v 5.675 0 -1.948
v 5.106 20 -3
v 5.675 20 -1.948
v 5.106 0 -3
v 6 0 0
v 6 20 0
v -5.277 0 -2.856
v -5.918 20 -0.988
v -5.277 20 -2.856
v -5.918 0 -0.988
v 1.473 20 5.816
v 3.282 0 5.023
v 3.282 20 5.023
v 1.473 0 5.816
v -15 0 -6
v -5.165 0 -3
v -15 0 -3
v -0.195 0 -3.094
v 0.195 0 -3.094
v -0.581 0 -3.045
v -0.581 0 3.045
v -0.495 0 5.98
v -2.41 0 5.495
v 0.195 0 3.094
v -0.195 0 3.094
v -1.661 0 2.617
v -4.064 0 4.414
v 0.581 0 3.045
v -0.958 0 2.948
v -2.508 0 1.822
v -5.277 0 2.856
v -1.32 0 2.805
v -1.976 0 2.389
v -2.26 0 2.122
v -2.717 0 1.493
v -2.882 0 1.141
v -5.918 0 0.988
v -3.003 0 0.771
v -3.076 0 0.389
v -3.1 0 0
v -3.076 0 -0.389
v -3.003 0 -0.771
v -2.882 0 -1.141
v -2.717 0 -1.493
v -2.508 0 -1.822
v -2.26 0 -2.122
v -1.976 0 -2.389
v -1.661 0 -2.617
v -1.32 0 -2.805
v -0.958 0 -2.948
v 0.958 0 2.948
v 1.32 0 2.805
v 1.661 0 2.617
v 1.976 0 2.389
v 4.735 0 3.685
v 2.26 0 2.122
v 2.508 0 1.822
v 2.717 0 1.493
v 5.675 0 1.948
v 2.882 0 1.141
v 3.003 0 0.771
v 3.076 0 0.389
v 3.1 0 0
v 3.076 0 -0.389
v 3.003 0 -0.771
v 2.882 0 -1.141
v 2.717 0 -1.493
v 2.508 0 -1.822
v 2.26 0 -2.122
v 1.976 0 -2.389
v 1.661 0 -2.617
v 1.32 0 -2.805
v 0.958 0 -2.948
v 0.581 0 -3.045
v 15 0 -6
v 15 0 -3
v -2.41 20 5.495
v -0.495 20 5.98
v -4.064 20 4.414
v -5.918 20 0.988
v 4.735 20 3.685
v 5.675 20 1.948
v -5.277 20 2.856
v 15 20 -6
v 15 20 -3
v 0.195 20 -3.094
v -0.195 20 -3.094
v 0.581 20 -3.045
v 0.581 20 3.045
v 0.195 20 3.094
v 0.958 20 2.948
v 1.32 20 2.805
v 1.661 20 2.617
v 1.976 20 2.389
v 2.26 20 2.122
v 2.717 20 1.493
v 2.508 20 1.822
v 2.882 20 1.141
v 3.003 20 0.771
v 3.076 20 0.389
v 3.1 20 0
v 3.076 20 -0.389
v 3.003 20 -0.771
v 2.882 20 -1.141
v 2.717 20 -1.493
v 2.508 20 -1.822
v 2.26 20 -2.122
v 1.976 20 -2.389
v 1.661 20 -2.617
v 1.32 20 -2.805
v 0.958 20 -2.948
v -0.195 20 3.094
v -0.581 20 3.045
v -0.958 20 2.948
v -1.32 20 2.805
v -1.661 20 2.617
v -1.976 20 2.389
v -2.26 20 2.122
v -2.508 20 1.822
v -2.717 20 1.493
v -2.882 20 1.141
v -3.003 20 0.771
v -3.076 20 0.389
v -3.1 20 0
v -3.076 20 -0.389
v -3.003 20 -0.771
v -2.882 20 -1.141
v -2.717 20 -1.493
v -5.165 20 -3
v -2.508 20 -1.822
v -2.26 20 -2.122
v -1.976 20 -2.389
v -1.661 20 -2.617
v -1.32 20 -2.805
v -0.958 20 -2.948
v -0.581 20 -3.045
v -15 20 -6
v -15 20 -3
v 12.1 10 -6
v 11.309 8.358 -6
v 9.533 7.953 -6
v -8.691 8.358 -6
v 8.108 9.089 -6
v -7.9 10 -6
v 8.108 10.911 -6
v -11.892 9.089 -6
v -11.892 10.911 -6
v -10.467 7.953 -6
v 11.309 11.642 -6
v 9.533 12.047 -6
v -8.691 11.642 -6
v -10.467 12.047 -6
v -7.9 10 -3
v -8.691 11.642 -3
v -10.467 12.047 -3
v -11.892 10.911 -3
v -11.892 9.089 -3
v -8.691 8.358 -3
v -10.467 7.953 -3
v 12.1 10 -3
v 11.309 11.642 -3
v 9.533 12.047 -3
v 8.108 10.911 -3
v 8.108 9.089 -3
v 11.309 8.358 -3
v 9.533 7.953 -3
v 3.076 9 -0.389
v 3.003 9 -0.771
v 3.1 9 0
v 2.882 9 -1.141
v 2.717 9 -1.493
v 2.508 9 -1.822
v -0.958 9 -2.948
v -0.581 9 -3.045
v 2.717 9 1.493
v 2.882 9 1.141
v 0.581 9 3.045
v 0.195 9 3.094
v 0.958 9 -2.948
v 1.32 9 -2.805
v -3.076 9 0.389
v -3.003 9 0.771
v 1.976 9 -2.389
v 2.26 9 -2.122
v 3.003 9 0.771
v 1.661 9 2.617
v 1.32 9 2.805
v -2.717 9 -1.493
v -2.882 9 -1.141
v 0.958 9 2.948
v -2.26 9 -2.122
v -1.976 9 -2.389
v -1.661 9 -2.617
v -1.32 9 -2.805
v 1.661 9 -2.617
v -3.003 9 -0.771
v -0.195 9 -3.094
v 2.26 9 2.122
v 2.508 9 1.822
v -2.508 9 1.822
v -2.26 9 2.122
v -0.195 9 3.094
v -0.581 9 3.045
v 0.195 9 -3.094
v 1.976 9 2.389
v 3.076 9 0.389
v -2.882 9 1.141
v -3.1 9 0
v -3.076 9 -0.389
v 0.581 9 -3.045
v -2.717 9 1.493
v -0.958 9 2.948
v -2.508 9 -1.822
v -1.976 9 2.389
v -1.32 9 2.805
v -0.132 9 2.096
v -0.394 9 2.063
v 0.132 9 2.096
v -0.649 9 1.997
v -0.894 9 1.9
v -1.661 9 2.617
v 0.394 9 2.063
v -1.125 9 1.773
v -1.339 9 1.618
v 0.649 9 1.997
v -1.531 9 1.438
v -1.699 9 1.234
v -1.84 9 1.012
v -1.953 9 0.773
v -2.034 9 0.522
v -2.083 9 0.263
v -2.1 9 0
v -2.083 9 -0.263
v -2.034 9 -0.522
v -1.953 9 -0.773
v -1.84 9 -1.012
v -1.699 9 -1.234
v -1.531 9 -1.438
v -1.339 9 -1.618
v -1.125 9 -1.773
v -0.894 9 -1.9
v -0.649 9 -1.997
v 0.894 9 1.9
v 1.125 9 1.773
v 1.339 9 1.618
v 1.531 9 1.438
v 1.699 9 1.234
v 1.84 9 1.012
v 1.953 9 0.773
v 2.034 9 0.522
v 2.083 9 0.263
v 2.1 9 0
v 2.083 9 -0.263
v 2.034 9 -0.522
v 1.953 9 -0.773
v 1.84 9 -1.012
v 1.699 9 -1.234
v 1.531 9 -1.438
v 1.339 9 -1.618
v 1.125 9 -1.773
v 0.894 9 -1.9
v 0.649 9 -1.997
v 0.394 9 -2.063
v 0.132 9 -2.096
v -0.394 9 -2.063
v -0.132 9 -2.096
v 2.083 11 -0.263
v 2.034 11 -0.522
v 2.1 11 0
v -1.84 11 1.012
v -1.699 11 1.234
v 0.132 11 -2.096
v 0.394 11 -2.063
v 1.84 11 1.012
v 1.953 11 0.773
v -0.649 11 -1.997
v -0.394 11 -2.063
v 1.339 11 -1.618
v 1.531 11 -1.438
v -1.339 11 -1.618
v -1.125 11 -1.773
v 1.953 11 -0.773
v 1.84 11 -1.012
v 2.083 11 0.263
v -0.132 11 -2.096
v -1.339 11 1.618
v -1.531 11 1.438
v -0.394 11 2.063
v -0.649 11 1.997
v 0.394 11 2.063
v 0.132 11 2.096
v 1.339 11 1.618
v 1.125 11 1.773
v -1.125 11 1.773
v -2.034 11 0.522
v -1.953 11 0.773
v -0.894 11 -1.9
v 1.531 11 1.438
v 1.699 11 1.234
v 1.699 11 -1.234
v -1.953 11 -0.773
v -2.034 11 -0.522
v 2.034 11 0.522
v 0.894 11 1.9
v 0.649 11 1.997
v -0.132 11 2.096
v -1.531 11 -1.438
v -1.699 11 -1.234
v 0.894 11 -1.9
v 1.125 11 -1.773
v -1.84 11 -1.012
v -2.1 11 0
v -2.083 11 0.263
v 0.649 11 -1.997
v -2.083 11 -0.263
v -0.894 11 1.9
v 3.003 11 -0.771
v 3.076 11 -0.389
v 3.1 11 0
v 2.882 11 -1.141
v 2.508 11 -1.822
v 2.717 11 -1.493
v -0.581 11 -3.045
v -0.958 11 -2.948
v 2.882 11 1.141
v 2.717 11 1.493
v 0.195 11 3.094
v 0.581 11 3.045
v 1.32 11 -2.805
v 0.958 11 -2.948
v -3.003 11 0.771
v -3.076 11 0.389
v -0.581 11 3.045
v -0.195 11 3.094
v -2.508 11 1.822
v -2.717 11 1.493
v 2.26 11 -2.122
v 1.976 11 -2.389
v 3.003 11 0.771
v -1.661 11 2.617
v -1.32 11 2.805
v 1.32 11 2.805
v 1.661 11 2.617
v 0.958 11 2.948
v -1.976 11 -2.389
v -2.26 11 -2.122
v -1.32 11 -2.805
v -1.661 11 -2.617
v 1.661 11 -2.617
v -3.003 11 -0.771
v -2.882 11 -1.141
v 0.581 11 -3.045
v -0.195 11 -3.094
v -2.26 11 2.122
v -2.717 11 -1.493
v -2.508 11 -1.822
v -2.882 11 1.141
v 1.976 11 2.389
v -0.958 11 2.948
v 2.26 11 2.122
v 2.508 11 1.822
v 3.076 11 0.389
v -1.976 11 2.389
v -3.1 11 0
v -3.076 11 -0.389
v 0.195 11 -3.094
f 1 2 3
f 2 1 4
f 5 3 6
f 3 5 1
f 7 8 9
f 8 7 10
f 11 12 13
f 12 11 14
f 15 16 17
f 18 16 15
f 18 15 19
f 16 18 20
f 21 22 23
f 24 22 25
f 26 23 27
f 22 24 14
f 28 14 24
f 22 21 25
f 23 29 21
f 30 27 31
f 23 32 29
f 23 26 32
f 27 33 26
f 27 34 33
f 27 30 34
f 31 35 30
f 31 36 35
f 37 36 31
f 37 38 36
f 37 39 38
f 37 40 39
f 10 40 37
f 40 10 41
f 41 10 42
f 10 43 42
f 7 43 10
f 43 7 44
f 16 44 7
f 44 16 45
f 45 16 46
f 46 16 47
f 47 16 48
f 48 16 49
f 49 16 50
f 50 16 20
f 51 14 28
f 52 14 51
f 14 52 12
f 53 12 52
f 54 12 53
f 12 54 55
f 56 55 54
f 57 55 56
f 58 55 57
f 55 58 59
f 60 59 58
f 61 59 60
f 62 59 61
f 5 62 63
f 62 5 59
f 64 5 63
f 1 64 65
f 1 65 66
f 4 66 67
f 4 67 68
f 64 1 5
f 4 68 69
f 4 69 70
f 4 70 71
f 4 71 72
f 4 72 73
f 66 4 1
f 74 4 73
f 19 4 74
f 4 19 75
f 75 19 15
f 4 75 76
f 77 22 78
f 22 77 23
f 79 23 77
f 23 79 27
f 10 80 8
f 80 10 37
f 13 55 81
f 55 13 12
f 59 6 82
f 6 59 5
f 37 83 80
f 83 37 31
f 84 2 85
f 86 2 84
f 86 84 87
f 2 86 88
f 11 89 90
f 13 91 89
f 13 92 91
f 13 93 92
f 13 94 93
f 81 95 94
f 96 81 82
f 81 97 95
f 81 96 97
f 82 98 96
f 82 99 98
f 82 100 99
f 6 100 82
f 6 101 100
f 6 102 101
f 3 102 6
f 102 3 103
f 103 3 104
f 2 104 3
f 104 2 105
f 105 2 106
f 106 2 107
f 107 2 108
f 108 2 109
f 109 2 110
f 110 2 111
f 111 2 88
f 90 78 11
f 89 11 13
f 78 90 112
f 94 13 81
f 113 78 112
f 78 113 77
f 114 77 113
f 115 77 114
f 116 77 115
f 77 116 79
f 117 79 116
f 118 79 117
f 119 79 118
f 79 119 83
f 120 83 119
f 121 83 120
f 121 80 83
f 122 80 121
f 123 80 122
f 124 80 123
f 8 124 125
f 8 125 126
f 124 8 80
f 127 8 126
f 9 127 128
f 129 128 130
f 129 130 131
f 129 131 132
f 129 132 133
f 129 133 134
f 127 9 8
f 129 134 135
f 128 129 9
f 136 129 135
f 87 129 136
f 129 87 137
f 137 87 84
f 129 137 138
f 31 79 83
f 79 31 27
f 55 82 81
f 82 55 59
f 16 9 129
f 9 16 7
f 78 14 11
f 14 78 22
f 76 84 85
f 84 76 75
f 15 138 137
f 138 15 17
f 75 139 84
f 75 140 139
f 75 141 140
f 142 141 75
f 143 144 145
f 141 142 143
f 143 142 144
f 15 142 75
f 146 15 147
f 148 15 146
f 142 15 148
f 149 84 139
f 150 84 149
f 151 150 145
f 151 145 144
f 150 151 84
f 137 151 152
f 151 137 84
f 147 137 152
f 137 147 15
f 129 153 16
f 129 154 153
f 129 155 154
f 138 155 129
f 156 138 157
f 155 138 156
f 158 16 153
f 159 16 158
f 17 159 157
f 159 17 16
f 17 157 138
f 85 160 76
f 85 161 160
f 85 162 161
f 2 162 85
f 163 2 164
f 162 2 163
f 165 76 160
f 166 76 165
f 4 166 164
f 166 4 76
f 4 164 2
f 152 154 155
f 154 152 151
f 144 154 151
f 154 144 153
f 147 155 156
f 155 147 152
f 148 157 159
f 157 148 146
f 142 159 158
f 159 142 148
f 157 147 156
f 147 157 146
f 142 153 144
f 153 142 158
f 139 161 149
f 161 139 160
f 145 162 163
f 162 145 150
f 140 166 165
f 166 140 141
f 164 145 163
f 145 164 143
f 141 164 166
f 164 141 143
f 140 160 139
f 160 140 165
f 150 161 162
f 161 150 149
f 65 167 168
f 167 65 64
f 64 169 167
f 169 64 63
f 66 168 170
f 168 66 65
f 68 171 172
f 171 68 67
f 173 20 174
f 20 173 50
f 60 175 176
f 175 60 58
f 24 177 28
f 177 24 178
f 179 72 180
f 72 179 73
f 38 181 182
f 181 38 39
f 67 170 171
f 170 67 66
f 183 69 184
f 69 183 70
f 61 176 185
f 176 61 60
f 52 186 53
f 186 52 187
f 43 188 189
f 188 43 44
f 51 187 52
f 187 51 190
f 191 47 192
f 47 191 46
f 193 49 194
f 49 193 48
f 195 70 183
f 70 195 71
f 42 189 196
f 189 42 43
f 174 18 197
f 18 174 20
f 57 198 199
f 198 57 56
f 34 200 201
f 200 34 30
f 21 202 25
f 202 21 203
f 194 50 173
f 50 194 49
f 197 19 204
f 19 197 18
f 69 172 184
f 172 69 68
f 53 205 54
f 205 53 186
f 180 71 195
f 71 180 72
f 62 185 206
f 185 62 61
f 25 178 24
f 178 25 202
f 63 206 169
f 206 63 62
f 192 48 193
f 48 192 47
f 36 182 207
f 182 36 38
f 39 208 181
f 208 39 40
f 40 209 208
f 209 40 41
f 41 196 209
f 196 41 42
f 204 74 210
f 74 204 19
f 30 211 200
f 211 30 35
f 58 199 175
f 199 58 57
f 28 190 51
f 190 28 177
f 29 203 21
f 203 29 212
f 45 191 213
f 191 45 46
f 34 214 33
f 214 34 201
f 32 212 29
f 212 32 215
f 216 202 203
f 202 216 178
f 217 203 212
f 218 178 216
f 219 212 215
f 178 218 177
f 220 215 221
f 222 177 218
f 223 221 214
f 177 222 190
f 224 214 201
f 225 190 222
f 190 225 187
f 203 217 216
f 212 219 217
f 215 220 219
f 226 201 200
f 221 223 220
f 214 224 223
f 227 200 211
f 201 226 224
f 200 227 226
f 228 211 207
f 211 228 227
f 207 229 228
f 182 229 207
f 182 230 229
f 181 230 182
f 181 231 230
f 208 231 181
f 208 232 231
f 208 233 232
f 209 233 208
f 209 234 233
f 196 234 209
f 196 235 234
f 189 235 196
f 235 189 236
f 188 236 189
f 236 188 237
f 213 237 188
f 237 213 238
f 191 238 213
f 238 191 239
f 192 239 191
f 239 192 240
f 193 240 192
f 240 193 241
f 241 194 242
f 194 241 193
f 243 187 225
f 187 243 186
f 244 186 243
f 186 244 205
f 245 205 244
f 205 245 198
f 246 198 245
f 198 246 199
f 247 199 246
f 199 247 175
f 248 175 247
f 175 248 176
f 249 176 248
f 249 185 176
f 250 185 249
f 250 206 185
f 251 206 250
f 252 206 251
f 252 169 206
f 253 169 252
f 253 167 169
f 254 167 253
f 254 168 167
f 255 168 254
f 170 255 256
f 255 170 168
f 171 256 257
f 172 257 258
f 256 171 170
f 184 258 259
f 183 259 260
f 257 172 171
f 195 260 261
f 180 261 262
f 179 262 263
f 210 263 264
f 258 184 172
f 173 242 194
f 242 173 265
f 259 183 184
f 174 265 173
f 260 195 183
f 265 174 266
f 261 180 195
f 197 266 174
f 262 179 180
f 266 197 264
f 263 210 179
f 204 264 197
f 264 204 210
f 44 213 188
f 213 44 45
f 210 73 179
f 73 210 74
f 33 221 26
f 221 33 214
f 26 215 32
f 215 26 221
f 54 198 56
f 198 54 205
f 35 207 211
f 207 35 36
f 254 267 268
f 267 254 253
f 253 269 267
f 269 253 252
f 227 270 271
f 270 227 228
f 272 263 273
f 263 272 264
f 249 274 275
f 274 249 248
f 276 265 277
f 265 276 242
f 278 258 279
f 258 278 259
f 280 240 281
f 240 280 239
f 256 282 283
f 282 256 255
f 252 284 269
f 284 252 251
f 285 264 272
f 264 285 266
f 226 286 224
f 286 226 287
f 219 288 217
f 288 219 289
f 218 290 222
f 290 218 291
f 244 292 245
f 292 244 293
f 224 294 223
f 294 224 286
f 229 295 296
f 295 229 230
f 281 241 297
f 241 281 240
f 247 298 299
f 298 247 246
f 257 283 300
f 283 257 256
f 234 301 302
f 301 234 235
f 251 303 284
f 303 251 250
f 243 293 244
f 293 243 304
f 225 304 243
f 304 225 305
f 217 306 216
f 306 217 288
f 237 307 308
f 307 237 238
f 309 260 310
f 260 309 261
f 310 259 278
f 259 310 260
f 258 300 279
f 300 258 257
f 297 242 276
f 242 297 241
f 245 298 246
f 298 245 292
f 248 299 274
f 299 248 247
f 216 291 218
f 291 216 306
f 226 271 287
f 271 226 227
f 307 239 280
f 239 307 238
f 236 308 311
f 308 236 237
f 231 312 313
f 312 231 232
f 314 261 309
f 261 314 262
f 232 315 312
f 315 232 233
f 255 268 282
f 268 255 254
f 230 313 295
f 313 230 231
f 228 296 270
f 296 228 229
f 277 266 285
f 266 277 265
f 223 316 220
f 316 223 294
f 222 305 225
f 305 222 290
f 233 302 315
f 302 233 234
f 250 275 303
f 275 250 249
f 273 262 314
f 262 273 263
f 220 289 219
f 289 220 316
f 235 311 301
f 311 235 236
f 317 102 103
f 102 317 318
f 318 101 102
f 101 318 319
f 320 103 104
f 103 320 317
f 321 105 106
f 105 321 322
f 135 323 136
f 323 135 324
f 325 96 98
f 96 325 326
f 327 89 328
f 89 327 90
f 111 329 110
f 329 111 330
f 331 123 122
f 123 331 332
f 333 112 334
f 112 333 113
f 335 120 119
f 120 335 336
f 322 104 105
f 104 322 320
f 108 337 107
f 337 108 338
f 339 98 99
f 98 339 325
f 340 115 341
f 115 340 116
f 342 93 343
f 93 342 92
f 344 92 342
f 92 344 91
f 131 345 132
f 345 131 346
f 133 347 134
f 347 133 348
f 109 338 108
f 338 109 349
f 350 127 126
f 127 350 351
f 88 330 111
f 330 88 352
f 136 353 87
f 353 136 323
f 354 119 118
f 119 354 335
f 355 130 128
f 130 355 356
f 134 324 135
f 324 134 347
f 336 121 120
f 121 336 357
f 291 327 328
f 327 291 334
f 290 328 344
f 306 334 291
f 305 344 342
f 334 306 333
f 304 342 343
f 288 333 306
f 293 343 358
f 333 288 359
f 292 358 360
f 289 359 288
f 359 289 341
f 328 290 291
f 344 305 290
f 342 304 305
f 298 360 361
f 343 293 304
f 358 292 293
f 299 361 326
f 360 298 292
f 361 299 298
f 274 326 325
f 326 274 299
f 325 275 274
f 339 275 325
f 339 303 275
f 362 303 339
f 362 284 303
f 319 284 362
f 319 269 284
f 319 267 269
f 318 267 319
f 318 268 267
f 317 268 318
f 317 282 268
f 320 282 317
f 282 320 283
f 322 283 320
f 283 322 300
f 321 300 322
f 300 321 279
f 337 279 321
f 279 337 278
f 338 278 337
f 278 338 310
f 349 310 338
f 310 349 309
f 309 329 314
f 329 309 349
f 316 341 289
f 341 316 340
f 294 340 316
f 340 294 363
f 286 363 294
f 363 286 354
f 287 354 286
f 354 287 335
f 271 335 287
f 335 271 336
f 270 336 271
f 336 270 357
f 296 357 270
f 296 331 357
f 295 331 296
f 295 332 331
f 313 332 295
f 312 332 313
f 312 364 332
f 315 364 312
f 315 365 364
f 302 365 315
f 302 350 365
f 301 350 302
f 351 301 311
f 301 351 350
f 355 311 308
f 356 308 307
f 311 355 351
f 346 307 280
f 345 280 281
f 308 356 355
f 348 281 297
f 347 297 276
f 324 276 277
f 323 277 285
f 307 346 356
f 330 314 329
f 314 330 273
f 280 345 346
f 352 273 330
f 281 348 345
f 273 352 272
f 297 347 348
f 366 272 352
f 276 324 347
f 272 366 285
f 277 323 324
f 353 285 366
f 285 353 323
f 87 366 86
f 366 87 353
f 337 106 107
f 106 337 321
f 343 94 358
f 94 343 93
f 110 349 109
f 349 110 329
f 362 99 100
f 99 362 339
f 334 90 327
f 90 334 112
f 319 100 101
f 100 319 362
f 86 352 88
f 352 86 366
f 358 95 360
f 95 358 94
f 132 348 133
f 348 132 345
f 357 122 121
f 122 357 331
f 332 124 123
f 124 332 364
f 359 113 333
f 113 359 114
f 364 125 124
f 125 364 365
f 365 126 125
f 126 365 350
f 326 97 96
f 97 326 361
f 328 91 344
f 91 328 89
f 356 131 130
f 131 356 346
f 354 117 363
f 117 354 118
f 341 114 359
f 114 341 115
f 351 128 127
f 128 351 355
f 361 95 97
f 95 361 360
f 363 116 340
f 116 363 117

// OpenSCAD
tube_dia = 6;
inner_dia = 4;
fn = 50;
screw_dia = 4;
thickness = 3;
rod_dia = 8;
clearance = 0.2;

rotate([-90, 0, 0]) {
    difference() {
        union() {
            cylinder(d=tube_dia + thickness * 2, h=20);
            translate([-15, thickness, 0]) cube([30, thickness, 20]);
        }
        cylinder(d=tube_dia + clearance, h=9, $fn=fn);
        translate([0, 0, 9]) # cylinder(d=inner_dia + clearance, h=10, $fn=fn);
        translate([0, 0, 11]) cylinder(d=tube_dia + clearance, h=9, $fn=fn);
        for(i=[-1,1]) {
            translate([i*10, 7.5 - thickness/2, 10]) rotate([90, 0, 0]) # cylinder(d=screw_dia + clearance, h=thickness);
        }
    }
}
